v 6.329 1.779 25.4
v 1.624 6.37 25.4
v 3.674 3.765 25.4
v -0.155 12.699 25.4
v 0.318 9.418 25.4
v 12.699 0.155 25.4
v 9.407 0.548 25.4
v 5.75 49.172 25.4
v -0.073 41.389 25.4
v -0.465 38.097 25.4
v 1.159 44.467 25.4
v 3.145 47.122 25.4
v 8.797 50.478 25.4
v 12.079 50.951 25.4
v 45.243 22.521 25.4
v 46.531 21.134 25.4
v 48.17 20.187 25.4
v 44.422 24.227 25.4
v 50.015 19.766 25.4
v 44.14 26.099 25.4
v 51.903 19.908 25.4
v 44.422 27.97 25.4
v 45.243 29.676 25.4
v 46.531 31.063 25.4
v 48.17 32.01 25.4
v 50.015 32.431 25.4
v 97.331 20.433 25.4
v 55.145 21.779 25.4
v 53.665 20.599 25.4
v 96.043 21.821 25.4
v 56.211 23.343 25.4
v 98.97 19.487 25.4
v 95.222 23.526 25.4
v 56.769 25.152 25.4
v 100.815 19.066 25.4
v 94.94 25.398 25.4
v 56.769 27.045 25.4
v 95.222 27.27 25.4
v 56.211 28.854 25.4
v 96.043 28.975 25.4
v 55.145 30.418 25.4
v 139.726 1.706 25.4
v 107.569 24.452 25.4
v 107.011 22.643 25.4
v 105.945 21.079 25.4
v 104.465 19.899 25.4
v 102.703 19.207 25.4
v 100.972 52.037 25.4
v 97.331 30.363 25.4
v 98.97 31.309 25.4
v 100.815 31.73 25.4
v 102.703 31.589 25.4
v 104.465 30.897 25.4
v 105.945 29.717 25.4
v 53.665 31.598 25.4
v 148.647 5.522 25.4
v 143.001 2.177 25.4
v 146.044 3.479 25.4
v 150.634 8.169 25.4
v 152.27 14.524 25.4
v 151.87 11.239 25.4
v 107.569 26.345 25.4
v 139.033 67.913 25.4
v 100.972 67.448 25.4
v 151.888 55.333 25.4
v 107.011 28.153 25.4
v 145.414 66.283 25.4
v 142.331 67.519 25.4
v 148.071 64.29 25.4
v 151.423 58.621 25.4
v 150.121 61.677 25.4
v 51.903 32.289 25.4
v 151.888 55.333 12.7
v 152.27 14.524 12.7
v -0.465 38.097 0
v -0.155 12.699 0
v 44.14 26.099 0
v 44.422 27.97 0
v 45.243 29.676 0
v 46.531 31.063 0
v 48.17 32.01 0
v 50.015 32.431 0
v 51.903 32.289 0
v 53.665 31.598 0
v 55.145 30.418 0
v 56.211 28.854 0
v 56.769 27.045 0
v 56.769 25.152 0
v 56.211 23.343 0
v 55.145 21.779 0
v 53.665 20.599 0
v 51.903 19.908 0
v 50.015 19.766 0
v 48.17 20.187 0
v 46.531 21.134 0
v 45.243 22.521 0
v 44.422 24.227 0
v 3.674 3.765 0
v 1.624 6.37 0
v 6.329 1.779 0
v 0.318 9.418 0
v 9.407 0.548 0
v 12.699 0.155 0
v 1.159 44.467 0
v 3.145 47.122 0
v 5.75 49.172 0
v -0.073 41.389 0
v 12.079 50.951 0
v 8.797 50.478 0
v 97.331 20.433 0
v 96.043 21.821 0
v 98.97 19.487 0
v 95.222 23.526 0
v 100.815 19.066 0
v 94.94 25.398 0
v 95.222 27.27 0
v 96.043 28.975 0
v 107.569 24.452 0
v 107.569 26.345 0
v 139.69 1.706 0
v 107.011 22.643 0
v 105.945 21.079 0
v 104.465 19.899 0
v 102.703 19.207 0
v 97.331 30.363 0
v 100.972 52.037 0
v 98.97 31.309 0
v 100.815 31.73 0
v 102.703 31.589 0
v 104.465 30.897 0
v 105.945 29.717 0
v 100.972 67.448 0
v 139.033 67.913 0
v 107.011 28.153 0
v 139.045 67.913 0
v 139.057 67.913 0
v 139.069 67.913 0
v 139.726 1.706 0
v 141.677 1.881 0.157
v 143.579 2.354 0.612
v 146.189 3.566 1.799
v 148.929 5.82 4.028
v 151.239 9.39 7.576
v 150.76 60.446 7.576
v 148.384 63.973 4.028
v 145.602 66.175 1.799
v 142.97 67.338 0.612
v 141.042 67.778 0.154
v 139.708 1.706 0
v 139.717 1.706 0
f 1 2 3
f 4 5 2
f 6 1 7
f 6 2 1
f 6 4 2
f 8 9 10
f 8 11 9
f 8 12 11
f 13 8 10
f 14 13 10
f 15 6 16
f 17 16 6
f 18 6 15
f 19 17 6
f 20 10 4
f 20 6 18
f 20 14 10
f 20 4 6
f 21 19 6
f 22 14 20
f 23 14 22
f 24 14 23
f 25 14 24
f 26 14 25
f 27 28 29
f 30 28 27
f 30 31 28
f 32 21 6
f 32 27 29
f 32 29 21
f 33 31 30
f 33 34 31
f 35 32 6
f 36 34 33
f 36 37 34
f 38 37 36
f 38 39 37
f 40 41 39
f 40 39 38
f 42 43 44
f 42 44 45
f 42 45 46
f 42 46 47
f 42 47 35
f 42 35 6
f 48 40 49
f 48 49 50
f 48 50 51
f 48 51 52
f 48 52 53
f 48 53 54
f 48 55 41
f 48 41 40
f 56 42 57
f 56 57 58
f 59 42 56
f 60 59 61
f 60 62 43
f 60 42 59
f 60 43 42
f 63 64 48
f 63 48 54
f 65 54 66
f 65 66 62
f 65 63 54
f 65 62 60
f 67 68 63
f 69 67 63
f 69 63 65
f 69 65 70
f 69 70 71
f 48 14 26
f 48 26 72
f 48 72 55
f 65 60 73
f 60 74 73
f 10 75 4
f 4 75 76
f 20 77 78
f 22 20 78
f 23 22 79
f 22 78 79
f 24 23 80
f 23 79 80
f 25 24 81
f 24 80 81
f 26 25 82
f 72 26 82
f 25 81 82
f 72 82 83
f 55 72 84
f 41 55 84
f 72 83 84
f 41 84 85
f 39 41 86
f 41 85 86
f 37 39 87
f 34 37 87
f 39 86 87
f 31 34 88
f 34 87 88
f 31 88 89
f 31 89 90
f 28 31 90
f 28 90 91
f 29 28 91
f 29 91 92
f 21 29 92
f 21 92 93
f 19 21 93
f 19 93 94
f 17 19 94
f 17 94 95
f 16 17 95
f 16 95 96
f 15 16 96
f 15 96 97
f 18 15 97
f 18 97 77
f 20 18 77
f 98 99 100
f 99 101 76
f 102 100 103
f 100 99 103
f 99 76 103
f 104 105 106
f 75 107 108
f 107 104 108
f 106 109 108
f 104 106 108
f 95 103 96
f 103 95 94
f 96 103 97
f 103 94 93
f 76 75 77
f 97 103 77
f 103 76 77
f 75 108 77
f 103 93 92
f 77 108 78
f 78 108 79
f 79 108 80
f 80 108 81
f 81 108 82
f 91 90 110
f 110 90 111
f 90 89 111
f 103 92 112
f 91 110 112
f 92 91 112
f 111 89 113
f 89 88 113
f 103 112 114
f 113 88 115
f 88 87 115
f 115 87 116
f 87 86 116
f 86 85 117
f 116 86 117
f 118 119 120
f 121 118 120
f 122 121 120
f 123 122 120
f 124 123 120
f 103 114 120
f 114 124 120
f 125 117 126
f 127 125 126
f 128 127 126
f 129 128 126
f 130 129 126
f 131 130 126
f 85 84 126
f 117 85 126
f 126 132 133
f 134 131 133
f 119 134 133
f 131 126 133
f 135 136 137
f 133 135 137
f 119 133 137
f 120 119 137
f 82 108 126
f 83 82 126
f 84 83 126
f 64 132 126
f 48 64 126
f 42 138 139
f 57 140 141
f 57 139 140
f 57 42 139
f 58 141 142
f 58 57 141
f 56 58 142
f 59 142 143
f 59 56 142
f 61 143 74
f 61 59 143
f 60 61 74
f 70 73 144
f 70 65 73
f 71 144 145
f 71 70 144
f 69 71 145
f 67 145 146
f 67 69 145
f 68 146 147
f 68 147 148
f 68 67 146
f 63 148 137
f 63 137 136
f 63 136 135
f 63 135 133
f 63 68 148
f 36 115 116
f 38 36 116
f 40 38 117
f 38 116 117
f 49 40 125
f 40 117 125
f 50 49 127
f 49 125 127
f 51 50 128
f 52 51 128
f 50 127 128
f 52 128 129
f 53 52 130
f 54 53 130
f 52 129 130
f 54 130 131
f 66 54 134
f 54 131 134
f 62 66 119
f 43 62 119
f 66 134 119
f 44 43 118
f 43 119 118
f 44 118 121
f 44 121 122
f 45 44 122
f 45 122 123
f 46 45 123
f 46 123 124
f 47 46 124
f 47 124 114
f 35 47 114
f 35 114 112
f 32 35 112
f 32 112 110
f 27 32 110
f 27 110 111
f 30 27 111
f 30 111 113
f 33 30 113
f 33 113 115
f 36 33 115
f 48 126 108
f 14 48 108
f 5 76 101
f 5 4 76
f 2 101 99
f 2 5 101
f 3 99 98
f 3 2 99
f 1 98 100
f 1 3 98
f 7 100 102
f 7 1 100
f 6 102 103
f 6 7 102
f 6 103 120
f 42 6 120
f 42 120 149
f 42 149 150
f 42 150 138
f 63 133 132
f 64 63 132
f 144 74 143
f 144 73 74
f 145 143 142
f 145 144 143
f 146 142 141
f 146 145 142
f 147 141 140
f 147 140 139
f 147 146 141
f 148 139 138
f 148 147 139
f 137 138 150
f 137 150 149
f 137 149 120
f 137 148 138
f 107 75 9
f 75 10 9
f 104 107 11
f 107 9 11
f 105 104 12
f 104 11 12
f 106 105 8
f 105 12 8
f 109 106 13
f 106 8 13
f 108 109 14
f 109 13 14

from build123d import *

# Parameters (mm, degrees)
F1_DEPTH = 25.4
F2_R     = 12.7
F4_D     = 12.7


with BuildPart() as f1:
    # F0 (on Top) → F1 (new body)
    with BuildSketch(Plane.XY):
        Polygon((-0.620216, 50.796214), (0, 0), (152.388641, 1.860649), (151.768425, 68.068433), (100.972211, 67.448217), (100.972211, 52.036646), align=None)
    extrude(amount=F1_DEPTH)

    # F2
    f2_edges = [f1.edges().sort_by_distance(p)[0] for p in [
        (-0.620216, 50.796214, 12.7),
        (152.078533, 34.964541, 0),
        (152.388641, 1.860649, 12.7),
        (0, 0, 12.7),
        (151.768425, 68.068433, 12.7),
    ]]
    fillet(f2_edges, radius=F2_R)

    # F4 (through all)
    with Locations(Plane.XY.offset(25.4)):
        with Locations((101.289892, 25.398107), (50.489892, 26.098501)):
            Hole(F4_D / 2)


solid = f1.part
